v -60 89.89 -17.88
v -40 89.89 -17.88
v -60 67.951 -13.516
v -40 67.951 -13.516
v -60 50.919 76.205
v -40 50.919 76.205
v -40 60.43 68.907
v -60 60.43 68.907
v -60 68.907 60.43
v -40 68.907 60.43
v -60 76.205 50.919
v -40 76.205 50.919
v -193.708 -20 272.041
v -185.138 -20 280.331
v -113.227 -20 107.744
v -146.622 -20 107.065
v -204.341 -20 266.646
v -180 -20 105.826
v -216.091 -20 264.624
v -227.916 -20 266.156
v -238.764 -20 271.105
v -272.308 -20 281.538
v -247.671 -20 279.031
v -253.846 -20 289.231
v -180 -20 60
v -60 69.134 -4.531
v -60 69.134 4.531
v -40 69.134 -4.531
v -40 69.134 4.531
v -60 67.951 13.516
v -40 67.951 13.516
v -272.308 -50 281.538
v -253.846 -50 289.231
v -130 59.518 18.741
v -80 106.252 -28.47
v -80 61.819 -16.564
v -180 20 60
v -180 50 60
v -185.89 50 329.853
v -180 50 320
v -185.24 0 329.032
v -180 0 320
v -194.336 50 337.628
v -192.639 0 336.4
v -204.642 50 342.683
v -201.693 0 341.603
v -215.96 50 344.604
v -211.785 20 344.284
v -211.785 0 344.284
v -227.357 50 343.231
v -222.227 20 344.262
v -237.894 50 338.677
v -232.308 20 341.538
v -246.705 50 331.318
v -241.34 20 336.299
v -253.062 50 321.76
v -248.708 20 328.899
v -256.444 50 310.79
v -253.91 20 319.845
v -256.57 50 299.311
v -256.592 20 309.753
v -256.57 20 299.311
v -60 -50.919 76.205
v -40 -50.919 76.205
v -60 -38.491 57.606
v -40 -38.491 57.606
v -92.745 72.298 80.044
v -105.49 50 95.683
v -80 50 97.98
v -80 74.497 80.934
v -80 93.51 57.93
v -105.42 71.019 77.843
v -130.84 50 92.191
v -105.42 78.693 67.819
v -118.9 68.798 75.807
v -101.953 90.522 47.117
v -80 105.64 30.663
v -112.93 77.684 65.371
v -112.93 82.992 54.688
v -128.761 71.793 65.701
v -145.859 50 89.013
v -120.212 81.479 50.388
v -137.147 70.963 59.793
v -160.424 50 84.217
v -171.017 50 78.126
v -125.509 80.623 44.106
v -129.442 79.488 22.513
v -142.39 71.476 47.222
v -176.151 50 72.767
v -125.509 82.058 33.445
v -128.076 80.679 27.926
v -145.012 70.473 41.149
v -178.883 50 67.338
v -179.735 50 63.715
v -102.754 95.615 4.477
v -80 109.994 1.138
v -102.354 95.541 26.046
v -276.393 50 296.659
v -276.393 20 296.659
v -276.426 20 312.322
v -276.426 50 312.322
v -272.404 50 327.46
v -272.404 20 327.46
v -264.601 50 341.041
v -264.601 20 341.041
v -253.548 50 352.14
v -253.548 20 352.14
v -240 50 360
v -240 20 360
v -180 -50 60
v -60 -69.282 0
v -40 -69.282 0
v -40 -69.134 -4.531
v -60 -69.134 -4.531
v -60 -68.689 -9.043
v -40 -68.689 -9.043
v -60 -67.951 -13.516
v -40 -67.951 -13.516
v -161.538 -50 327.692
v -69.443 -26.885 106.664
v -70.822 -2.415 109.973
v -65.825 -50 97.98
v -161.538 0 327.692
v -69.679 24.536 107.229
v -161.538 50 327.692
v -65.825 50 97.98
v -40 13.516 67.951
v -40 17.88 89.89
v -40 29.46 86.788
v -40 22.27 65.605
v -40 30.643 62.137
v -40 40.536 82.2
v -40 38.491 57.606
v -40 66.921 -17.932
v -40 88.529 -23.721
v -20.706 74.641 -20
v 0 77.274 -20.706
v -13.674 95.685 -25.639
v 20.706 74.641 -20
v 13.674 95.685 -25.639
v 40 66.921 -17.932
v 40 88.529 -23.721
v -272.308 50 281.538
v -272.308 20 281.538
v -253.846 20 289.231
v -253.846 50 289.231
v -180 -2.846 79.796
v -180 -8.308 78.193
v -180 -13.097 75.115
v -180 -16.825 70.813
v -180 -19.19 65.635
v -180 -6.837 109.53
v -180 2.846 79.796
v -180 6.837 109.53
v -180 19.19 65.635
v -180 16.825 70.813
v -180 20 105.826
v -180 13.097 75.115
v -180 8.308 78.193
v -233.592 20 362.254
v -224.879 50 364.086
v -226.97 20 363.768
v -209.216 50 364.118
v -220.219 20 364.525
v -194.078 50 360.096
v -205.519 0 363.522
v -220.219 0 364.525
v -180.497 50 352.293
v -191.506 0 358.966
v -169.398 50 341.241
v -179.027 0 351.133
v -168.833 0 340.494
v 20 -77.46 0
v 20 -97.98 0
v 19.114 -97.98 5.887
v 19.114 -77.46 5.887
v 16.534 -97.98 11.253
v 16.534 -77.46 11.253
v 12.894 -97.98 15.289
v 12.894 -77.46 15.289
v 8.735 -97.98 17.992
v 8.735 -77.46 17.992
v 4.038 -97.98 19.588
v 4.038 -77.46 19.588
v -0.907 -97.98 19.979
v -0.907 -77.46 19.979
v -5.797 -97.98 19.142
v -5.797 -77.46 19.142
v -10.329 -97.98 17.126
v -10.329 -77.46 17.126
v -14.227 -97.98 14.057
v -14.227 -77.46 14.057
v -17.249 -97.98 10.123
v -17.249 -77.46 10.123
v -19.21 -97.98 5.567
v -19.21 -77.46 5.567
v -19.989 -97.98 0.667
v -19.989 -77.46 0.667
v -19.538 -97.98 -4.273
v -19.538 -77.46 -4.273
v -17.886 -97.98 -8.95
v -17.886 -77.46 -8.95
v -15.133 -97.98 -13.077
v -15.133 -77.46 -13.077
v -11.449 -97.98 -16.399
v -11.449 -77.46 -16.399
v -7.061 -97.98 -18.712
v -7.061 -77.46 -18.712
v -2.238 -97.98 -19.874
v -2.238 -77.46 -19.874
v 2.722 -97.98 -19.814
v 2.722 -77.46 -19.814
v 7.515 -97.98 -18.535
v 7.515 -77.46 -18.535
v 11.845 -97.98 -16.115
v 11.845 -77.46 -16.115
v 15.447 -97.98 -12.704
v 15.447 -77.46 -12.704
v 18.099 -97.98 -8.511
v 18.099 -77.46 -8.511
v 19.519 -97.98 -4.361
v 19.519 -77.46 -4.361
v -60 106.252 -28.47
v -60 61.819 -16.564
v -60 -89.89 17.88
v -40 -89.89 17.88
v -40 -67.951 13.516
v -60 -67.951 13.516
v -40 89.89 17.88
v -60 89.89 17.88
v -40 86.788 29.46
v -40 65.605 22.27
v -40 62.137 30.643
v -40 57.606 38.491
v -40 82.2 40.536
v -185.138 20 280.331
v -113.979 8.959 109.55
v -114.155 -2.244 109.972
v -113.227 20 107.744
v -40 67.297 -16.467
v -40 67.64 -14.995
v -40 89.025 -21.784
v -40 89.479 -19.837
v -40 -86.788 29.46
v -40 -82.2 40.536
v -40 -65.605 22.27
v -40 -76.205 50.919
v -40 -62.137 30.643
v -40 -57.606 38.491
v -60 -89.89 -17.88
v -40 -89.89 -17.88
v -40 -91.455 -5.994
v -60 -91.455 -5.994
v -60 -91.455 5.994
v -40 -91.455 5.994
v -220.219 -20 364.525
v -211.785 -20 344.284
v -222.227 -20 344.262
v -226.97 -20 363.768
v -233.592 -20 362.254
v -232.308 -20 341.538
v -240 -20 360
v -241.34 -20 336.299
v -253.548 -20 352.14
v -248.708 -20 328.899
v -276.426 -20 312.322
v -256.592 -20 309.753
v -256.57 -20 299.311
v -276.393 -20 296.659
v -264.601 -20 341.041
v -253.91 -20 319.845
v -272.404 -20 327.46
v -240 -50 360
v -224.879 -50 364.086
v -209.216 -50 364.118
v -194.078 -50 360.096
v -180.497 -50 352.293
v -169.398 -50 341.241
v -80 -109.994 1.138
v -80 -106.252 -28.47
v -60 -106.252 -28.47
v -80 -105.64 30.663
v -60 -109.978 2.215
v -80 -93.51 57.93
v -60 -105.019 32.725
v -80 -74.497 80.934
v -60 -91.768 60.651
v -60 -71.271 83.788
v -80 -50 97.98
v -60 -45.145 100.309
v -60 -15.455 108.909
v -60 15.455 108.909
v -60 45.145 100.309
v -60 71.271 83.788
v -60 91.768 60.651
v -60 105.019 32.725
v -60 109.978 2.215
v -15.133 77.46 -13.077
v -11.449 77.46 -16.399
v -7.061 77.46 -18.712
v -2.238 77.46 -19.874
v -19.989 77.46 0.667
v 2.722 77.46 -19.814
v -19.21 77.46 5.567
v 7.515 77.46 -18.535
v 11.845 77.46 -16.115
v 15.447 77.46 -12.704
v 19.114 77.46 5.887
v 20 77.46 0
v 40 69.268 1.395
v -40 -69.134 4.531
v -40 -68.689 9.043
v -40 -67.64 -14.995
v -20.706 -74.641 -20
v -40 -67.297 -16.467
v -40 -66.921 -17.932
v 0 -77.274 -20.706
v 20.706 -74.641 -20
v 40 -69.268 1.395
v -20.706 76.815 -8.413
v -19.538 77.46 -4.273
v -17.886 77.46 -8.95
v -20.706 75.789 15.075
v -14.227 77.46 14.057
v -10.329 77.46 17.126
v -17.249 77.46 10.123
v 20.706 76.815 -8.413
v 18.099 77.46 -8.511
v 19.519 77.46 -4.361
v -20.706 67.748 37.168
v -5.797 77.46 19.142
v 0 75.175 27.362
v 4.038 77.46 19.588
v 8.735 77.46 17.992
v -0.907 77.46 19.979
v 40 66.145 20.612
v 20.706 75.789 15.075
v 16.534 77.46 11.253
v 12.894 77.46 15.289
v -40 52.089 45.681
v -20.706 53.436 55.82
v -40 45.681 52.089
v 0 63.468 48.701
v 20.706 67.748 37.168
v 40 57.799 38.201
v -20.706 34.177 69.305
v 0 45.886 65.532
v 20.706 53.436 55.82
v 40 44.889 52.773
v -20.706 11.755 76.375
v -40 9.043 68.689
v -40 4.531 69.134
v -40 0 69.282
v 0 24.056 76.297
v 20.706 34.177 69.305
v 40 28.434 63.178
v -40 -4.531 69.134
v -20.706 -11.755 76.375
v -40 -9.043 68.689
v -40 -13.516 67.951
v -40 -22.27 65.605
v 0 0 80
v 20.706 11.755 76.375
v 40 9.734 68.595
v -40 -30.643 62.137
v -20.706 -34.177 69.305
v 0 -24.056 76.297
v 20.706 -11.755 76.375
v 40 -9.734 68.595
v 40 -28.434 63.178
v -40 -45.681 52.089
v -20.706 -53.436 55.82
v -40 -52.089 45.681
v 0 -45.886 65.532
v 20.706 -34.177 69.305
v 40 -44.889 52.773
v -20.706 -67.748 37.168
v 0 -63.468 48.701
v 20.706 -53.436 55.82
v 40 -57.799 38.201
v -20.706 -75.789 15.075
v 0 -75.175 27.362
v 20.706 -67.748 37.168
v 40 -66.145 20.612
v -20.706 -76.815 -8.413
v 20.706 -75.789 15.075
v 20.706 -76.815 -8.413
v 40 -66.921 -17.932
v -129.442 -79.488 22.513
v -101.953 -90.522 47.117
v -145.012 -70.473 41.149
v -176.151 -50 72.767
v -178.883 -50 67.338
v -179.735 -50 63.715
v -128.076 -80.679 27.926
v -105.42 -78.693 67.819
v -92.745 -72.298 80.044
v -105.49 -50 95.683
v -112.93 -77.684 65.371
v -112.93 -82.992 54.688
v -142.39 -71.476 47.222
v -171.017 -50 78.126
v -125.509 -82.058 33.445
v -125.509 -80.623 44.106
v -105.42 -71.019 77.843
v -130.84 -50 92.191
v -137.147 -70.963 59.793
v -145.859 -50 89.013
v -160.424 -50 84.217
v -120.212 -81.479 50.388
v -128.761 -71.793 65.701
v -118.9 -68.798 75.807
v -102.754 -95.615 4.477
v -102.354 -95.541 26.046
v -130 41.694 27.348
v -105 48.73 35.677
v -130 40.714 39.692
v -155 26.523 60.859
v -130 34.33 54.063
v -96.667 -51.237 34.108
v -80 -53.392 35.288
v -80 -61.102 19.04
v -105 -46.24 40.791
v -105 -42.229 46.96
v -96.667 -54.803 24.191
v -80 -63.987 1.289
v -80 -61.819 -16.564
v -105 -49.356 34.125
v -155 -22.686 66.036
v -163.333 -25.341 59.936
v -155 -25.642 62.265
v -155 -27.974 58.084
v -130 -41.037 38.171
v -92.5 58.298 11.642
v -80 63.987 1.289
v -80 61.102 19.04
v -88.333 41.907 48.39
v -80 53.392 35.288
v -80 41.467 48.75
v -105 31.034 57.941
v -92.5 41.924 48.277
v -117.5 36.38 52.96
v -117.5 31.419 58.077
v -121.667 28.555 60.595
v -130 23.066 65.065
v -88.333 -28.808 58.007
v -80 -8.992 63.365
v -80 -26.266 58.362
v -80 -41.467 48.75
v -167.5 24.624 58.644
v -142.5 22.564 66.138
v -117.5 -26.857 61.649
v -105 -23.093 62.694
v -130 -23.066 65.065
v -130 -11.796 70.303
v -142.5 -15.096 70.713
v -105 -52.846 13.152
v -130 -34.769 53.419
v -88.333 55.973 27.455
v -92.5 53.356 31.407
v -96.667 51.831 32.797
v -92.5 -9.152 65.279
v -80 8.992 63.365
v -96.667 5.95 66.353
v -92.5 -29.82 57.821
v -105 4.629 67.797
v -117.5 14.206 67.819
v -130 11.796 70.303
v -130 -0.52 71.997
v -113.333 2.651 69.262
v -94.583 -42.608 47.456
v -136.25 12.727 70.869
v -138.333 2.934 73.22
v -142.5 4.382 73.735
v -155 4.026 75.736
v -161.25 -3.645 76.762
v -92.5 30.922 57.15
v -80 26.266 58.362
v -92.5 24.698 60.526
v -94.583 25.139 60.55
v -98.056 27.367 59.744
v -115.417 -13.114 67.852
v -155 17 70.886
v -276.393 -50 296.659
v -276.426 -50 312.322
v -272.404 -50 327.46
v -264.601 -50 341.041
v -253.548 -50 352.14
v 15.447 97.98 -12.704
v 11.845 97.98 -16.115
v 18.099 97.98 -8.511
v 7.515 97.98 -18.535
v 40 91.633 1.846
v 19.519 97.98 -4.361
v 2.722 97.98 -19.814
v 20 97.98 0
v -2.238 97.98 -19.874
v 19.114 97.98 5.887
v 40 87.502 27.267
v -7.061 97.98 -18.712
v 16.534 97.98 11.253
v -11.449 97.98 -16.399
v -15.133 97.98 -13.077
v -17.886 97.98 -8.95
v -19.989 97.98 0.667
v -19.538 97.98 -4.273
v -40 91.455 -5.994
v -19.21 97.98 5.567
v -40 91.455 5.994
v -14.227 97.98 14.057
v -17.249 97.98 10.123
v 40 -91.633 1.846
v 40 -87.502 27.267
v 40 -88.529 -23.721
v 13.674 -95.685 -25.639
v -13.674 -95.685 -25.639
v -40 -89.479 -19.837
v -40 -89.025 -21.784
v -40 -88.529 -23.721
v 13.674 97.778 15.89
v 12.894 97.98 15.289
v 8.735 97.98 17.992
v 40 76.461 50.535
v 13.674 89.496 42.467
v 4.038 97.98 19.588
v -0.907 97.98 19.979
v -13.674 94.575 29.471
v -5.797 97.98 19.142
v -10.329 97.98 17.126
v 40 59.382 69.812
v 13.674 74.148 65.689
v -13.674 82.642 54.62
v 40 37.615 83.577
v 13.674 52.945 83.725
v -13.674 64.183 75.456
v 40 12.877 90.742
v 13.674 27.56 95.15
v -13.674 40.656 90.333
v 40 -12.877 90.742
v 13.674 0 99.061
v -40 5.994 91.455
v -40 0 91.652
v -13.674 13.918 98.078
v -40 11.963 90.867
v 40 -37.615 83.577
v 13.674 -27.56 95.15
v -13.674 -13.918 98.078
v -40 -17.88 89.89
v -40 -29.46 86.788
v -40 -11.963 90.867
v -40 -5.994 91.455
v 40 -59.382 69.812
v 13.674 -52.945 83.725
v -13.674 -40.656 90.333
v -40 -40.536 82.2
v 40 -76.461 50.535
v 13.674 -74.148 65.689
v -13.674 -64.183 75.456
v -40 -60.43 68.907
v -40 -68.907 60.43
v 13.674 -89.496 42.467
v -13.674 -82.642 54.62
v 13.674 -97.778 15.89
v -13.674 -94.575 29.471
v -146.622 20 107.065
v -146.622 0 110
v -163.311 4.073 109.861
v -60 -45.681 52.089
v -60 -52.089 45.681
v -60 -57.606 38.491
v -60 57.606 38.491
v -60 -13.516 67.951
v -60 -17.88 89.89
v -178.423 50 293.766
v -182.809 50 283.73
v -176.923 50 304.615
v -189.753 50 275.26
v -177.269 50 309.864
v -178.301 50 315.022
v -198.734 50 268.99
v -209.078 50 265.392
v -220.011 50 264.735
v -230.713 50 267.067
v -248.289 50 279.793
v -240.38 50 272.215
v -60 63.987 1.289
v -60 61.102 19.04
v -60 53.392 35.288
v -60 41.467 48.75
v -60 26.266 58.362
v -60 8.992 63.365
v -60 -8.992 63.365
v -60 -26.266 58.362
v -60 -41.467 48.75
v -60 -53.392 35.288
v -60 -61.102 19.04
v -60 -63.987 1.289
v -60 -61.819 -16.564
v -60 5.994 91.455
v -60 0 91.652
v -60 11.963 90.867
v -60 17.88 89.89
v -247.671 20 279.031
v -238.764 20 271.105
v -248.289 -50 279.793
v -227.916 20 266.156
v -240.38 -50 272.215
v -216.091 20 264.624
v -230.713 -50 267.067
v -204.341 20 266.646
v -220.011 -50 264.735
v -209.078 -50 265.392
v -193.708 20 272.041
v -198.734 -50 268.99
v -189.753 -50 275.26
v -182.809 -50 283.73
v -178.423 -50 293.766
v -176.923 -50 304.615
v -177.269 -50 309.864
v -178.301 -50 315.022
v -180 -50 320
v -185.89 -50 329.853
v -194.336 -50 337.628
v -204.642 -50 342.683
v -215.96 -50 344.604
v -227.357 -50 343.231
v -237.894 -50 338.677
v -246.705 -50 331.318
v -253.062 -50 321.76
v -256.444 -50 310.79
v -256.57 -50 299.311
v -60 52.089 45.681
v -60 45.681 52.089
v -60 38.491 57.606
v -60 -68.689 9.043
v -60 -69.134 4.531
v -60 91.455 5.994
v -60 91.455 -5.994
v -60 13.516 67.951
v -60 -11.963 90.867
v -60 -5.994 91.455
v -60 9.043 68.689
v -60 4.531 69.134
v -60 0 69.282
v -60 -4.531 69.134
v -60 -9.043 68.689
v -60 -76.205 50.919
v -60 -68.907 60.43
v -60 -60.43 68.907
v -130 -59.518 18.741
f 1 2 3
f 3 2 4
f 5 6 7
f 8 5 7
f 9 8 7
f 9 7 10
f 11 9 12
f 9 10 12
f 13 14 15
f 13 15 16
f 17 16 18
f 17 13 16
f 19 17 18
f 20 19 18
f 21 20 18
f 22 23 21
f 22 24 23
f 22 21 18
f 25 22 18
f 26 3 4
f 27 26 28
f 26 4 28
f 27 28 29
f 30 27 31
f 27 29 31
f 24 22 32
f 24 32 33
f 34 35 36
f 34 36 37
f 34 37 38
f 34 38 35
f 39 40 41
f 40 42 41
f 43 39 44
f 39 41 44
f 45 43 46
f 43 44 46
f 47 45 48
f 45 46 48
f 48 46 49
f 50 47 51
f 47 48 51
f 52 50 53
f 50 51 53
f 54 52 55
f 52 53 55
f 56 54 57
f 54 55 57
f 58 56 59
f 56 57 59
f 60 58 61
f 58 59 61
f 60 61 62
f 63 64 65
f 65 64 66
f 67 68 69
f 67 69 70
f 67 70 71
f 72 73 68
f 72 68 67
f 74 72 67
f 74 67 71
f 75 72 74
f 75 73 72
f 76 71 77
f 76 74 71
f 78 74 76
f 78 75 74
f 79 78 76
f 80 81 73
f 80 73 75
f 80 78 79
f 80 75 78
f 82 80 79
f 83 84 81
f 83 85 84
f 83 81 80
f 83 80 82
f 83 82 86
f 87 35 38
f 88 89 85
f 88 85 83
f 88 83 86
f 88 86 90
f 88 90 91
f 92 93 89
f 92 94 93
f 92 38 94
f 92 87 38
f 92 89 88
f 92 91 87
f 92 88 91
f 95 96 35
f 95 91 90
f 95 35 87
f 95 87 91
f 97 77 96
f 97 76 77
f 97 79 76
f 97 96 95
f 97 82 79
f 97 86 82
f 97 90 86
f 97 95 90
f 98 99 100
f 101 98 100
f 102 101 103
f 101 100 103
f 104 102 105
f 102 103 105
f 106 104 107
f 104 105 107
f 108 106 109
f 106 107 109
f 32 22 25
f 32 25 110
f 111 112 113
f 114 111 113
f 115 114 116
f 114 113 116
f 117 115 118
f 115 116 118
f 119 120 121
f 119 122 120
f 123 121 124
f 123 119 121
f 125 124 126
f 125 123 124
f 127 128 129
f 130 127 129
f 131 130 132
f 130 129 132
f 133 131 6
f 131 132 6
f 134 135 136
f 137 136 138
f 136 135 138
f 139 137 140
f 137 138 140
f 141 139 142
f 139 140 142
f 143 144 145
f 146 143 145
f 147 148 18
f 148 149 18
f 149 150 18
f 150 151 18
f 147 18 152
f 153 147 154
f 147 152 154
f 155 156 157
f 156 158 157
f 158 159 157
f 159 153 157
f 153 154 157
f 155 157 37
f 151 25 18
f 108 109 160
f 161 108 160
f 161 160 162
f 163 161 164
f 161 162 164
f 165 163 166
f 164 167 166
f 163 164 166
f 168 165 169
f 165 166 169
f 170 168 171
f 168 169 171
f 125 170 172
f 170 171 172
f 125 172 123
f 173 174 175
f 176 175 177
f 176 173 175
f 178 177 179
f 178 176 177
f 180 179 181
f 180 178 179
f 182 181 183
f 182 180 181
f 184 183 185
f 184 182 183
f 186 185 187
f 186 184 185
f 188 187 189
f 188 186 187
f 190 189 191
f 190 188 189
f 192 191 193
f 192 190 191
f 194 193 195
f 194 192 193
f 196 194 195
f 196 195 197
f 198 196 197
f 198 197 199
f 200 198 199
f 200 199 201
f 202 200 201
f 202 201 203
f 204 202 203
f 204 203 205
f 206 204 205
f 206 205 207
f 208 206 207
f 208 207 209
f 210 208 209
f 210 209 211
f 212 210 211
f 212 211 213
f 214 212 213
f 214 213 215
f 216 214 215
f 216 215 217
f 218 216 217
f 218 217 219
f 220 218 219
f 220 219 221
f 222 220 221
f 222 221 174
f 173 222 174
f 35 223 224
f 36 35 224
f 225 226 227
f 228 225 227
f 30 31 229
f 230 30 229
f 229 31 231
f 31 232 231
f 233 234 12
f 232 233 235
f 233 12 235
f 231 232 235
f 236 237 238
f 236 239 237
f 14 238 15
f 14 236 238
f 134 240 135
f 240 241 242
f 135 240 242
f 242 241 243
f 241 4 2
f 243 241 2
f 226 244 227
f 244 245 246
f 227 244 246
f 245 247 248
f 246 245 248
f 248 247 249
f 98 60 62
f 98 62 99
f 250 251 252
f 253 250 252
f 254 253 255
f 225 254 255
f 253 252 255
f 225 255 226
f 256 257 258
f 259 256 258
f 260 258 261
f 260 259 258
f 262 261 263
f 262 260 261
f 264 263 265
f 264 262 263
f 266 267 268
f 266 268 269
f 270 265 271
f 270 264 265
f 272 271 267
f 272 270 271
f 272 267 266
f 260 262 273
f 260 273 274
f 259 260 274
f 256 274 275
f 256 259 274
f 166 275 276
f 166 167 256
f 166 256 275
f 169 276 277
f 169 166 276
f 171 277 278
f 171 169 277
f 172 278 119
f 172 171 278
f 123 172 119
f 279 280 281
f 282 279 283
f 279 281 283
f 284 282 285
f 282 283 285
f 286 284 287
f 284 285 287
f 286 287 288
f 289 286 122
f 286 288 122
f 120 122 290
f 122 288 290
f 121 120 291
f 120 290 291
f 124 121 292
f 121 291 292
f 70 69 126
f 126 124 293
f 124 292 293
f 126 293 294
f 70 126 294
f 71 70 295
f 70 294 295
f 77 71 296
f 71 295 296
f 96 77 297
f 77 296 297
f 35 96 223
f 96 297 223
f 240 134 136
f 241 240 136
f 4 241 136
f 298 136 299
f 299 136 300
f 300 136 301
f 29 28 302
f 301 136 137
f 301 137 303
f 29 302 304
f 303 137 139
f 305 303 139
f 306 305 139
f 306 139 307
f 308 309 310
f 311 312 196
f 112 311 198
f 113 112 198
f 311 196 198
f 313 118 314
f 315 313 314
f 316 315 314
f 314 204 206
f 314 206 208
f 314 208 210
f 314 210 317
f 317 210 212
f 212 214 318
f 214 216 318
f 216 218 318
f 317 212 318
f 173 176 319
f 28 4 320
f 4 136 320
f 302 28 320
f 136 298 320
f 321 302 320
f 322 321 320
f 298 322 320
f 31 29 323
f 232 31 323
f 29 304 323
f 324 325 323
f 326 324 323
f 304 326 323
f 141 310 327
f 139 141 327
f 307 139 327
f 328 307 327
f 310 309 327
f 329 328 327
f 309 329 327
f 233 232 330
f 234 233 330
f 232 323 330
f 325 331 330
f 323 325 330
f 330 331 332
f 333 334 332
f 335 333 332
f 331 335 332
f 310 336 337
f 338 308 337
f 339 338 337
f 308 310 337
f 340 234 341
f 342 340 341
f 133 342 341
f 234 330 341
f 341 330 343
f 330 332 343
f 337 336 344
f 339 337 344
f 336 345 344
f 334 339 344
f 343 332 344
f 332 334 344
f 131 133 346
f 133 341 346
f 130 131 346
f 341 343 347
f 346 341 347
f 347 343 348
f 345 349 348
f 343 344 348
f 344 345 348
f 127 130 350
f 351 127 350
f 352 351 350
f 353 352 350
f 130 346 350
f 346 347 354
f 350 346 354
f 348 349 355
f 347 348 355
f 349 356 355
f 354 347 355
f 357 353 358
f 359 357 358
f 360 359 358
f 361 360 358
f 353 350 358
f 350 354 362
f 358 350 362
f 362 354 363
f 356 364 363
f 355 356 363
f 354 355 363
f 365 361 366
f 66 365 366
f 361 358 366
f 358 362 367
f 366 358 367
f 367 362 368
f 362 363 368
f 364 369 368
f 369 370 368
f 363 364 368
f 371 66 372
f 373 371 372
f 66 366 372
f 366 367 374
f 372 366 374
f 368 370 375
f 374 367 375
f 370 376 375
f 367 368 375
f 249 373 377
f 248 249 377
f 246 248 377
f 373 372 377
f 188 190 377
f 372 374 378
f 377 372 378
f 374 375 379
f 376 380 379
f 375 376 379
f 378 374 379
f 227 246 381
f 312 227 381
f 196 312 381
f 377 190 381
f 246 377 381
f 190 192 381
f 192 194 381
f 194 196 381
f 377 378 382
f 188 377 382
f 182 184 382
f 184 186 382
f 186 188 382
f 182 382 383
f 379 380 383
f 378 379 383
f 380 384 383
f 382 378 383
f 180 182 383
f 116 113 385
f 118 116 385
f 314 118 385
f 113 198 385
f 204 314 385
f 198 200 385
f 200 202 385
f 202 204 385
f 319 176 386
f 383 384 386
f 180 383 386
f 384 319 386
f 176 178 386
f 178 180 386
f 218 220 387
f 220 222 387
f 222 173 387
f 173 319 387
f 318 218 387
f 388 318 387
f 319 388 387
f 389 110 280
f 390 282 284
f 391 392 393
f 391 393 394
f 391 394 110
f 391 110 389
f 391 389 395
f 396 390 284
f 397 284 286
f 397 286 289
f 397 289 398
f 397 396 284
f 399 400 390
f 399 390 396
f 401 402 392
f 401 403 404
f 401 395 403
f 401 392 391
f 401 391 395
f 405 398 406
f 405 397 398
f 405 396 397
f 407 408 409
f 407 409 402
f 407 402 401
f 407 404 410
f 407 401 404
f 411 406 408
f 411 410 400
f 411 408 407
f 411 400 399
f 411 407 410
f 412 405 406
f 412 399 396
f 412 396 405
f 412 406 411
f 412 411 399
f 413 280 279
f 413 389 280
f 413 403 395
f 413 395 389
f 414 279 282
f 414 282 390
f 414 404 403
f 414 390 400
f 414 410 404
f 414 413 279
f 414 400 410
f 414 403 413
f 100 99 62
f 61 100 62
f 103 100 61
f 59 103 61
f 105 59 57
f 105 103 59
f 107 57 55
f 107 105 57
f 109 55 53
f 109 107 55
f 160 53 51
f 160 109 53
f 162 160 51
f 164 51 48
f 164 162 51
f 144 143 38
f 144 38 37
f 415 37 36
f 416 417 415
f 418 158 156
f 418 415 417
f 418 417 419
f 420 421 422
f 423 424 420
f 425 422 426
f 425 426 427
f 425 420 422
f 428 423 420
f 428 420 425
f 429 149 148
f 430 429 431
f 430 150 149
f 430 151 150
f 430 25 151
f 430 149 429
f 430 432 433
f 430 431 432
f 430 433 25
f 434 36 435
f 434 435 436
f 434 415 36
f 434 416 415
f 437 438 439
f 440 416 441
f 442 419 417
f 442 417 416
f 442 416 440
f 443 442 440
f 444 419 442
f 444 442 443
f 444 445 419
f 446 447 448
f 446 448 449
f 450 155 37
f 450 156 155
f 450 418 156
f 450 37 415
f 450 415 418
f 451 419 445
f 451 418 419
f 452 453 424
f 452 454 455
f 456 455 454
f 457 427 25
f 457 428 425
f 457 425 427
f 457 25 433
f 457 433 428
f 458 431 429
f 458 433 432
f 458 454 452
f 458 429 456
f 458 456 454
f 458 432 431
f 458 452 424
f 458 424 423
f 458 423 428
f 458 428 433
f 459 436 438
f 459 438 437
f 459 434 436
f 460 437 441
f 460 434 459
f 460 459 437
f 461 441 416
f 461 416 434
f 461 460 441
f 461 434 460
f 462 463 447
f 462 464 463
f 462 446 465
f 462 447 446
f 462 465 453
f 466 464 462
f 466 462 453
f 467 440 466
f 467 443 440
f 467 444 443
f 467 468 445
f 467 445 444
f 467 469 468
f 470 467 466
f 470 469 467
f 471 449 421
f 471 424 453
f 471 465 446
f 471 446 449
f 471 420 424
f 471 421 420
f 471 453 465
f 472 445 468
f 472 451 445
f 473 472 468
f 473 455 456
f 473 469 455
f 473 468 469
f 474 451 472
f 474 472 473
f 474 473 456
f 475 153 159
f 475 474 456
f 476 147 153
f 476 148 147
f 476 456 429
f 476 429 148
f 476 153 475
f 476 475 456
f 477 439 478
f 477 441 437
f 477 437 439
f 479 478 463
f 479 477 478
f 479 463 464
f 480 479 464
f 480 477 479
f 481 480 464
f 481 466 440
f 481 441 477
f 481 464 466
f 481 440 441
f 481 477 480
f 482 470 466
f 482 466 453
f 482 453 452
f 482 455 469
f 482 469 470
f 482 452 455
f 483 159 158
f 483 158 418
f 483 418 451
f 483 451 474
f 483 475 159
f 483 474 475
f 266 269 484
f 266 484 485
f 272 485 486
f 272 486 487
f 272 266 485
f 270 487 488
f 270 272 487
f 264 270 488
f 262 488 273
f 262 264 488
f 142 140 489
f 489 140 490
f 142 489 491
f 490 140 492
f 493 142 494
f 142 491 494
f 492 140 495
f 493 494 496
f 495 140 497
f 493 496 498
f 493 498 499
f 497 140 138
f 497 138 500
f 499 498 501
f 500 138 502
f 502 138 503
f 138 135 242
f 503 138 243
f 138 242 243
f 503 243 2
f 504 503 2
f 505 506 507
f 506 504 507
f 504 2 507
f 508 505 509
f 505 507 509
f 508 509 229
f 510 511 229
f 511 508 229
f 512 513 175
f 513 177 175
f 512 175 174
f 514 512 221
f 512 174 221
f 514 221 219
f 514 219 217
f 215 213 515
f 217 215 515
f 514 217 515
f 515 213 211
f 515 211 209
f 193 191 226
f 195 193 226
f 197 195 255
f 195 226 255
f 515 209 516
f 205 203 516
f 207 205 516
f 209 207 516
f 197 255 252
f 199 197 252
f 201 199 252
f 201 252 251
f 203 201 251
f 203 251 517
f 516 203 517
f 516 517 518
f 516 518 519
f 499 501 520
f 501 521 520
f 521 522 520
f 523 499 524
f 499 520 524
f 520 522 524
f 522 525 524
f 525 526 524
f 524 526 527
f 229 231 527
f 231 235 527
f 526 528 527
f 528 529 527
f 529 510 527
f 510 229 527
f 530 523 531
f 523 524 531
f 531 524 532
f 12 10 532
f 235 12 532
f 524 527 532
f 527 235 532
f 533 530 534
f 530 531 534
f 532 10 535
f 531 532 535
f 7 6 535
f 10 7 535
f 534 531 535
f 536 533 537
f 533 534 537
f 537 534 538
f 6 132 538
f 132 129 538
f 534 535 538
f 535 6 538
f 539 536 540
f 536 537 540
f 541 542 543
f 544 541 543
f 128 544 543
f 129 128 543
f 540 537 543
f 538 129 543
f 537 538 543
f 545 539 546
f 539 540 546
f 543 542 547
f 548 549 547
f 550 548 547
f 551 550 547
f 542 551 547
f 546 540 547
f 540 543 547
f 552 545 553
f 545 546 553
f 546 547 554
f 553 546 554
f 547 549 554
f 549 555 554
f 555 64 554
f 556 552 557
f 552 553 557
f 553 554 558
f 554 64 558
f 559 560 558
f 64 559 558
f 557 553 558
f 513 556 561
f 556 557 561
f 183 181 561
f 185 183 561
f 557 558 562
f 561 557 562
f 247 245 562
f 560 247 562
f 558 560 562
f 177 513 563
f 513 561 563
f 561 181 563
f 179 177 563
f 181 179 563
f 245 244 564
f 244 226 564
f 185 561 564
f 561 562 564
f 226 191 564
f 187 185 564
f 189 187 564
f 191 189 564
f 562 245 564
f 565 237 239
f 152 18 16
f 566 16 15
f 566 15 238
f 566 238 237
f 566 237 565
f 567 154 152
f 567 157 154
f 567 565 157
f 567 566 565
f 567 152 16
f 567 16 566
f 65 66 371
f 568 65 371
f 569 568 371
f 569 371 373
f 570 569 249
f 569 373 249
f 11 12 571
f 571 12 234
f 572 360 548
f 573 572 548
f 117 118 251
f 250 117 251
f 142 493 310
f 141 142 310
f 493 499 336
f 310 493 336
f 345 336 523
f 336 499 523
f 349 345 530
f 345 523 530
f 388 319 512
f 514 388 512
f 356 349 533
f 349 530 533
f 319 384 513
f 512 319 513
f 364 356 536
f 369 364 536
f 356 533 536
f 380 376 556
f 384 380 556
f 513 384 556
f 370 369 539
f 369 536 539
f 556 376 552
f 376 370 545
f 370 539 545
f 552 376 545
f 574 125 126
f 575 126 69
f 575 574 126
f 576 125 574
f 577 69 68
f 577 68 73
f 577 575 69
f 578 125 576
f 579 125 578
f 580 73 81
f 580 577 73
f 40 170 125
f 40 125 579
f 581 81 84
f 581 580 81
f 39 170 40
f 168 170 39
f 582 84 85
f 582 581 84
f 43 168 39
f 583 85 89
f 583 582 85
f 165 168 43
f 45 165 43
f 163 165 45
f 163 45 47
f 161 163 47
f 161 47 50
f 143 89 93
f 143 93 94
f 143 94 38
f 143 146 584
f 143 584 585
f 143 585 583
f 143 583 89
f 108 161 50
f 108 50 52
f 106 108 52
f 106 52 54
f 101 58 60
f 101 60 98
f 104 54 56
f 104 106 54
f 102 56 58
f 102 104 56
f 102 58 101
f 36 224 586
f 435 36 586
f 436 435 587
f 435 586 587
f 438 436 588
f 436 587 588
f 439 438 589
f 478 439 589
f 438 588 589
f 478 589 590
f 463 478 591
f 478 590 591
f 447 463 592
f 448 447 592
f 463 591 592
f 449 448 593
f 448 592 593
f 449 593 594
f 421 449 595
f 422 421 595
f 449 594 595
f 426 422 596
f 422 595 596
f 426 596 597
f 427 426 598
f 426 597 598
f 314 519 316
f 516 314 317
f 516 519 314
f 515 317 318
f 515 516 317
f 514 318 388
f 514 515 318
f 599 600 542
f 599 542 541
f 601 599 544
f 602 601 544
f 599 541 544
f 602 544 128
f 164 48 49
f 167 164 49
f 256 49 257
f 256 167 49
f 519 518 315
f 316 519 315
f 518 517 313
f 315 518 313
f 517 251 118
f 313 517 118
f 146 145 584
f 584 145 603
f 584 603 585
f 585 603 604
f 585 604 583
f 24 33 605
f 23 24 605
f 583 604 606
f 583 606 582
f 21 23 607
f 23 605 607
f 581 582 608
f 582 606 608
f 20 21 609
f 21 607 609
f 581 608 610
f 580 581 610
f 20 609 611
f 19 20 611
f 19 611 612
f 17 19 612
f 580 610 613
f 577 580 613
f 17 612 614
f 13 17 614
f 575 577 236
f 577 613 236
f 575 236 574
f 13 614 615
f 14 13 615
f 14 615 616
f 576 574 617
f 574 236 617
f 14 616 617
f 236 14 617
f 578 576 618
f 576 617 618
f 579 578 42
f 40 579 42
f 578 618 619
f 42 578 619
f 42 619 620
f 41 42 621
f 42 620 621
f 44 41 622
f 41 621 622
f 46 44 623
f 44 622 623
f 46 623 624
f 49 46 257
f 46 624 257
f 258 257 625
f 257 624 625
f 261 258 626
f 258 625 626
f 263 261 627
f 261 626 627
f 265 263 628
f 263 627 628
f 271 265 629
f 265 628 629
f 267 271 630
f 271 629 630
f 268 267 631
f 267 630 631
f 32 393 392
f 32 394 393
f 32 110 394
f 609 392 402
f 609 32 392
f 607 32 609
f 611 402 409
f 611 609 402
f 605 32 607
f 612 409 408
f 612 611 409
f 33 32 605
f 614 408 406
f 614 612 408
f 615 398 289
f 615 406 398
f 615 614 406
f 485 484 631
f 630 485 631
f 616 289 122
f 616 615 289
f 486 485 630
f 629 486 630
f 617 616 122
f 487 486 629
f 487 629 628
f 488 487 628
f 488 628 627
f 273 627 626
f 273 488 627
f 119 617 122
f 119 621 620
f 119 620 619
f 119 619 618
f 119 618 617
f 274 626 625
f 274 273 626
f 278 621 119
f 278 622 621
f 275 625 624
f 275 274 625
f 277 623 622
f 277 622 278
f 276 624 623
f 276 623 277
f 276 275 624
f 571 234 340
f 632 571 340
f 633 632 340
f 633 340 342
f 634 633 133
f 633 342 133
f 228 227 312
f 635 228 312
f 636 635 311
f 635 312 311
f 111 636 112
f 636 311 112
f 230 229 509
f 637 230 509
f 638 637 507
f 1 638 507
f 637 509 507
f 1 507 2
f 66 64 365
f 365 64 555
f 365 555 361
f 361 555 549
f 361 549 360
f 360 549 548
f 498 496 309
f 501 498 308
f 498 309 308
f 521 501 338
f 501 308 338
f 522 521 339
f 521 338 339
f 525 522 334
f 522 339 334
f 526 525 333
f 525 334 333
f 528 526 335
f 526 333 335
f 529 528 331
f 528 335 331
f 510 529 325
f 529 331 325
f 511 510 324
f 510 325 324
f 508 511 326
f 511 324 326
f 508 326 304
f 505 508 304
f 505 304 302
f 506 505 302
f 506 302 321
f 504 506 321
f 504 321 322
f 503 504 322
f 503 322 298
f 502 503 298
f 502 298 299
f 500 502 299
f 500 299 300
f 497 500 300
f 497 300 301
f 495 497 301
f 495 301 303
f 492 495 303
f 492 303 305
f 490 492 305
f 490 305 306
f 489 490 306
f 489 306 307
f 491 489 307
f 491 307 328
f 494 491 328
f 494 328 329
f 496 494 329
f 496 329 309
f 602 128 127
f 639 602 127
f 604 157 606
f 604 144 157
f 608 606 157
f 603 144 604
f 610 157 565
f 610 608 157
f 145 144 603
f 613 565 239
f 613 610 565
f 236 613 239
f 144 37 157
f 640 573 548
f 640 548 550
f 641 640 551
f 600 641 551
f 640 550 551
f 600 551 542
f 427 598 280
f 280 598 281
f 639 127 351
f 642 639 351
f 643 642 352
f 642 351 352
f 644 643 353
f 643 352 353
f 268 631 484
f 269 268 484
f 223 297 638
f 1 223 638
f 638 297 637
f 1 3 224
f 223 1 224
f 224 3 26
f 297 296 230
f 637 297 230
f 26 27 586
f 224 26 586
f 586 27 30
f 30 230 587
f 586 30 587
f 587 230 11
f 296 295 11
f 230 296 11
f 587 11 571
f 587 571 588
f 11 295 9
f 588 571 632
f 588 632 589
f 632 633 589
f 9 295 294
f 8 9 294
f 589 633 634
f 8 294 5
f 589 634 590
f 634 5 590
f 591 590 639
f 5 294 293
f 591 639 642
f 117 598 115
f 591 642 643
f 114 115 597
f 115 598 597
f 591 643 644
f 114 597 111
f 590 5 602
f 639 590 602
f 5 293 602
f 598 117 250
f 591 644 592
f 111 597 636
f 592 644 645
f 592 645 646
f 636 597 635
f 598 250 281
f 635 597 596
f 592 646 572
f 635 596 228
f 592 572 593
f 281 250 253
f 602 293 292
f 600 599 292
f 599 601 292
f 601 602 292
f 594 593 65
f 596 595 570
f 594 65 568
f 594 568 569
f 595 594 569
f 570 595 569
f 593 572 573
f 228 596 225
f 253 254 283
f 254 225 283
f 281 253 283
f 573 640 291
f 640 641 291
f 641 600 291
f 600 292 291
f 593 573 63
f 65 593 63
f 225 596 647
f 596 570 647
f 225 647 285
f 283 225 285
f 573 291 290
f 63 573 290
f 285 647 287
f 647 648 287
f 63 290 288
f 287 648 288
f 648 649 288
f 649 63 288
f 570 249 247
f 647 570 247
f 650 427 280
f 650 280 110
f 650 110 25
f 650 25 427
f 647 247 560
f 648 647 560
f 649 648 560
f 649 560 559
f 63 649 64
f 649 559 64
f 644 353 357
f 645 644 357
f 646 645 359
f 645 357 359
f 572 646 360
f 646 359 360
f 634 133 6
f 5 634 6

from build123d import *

# Parameters (mm, degrees)
F1_ANGLE_BACK  = 105
F1_ANGLE       = 210
F2_R           = 20
F3_DEPTH       = 100.001
F3_DEPTH_BACK  = 100.001
F5_DEPTH       = 20
F7_DEPTH       = 20
F19_DEPTH      = 110.0010001
F19_DEPTH_BACK = 110.0010001


# Not quite as in the source:
# - a feature names something its author has since deleted; it is built from what else it names


with BuildPart() as f1:
    # F0 (on Front) → F1 (revolve)
    with BuildSketch(Plane.XZ, mode=Mode.PRIVATE) as f1_sk:
        with BuildLine():
            Line((40, 69.2820323028), (40, 91.6515138991))
            ThreePointArc((40, 91.6515138991), (0, 100), (-40, 91.6515138991))
            Line((-40, 91.6515138991), (-40, 69.2820323028))
            ThreePointArc((-40, 69.2820323028), (0, 80), (40, 69.2820323028))
        make_face()
    revolve(f1_sk.sketch.rotate(Axis((77.3328692646, 0, 0), (1, 0, 0)), -F1_ANGLE_BACK), axis=Axis((77.3328692646, 0, 0), (1, 0, 0)), revolution_arc=F1_ANGLE)

    # F2 (on Front) → F3 (cut, two sides)
    with BuildSketch(Plane.XZ) as f3_sk:
        Circle(F2_R)
    extrude(amount=-F3_DEPTH, mode=Mode.SUBTRACT)
    extrude(f3_sk.sketch, amount=F3_DEPTH_BACK, mode=Mode.SUBTRACT)

    # F4 (on face) → F5 (join)
    with BuildSketch(Plane(origin=(-40, 0, 0), x_dir=(0, -1, 0), z_dir=(-1, 0, 0))):
        with BuildLine():
            Line((0, 91.6515138991), (0, 69.2820323028))
            ThreePointArc((0, 69.2820323028), (6.7908266825, 68.9484203805), (13.5162539919, 67.950797479))
            Line((13.5162539919, 67.950797479), (17.8803233598, 89.8904557589))
            ThreePointArc((17.8803233598, 89.8904557589), (8.9834192993, 91.2101868088), (0, 91.6515138991))
        make_face()
        with BuildLine():
            ThreePointArc((-57.6059045383, 38.4910348305), (-48.9897948557, 48.9897948557), (-38.4910348305, 57.6059045383))
            Line((-38.4910348305, 57.6059045383), (-50.9188529335, 76.2054487286))
            ThreePointArc((-50.9188529335, 76.2054487286), (-64.8074069841, 64.8074069841), (-76.2054487286, 50.9188529335))
            Line((-76.2054487286, 50.9188529335), (-57.6059045383, 38.4910348305))
        make_face()
        with BuildLine():
            ThreePointArc((-67.950797479, -13.5162539919), (-69.2820323028, 0), (-67.950797479, 13.5162539919))
            Line((-67.950797479, 13.5162539919), (-89.8904557589, 17.8803233598))
            ThreePointArc((-89.8904557589, 17.8803233598), (-91.6515138991, 0), (-89.8904557589, -17.8803233598))
            Line((-89.8904557589, -17.8803233598), (-67.950797479, -13.5162539919))
        make_face()
        with BuildLine():
            Line((50.9188529335, 76.2054487286), (38.4910348305, 57.6059045383))
            ThreePointArc((38.4910348305, 57.6059045383), (48.9897948557, 48.9897948557), (57.6059045383, 38.4910348305))
            Line((57.6059045383, 38.4910348305), (76.2054487286, 50.9188529335))
            ThreePointArc((76.2054487286, 50.9188529335), (64.8074069841, 64.8074069841), (50.9188529335, 76.2054487286))
        make_face()
        with BuildLine():
            ThreePointArc((-13.5162539919, 67.950797479), (-6.7908266825, 68.9484203805), (0, 69.2820323028))
            Line((0, 69.2820323028), (0, 91.6515138991))
            ThreePointArc((0, 91.6515138991), (-8.9834192993, 91.2101868088), (-17.8803233598, 89.8904557589))
            Line((-17.8803233598, 89.8904557589), (-13.5162539919, 67.950797479))
        make_face()
        with BuildLine():
            Line((89.8904557589, 17.8803233598), (67.950797479, 13.5162539919))
            ThreePointArc((67.950797479, 13.5162539919), (68.9484203805, 6.7908266825), (69.2820323028, 0))
            ThreePointArc((69.2820323028, 0), (68.9484203805, -6.7908266825), (67.950797479, -13.5162539919))
            Line((67.950797479, -13.5162539919), (89.8904557589, -17.8803233598))
            ThreePointArc((89.8904557589, -17.8803233598), (91.6515138991, 0), (89.8904557589, 17.8803233598))
        make_face()
    extrude(amount=F5_DEPTH)

    # F6 (on face) → F7 (join)
    with BuildSketch(Plane(origin=(-60, 0, 0), x_dir=(0, -1, 0), z_dir=(-1, 0, 0))):
        with BuildLine():
            Line((61.8192528825, -16.5644188866), (106.2518408918, -28.4700949613))
            ThreePointArc((106.2518408918, -28.4700949613), (0, 110), (-106.2518408918, -28.4700949613))
            Line((-106.2518408918, -28.4700949613), (-61.8192528825, -16.5644188866))
            ThreePointArc((-61.8192528825, -16.5644188866), (0, 64), (61.8192528825, -16.5644188866))
        make_face()
    extrude(amount=F7_DEPTH)

    # F7_face (on face) → F11 section 0
    with BuildSketch(Plane(origin=(-80, 0, 46.9243182834), x_dir=(0, -1, 0), z_dir=(-1, 0, 0))):
        with BuildLine():
            Line((-106.2518408918, -75.3944132447), (-61.8192528825, -63.4887371699))
            ThreePointArc((-61.8192528825, -63.4887371699), (0, 17.0756817166), (61.8192528825, -63.4887371699))
            Line((61.8192528825, -63.4887371699), (106.2518408918, -75.3944132447))
            ThreePointArc((106.2518408918, -75.3944132447), (0, 63.0756817166), (-106.2518408918, -75.3944132447))
        make_face()
    # F9 (on offset) → F11 section 1
    with BuildSketch(Plane(origin=(-180, 0, 0), x_dir=(0, -1, 0), z_dir=(-1, 0, 0))):
        with BuildLine():
            Line((20, 60), (50, 60))
            ThreePointArc((50, 60), (0, 110), (-50, 60))
            Line((-50, 60), (-20, 60))
            ThreePointArc((-20, 60), (0, 80), (20, 60))
        make_face()
    loft()

    # F16 (on face) → F17 (join, up to the next surface of F1)
    with BuildSketch(Plane(origin=(-163.3136094675, 0, 391.9526627219), x_dir=(0.9230769231, 0, 0.3846153846), z_dir=(-0.3846153846, 0, 0.9230769231))):
        Polygon((-143.0769230769, -20), (-143.0769230769, -50), (-23.0769230769, -50), (-23.0769230769, 50), (-143.0769230769, 50), (-143.0769230769, 20), (-63.0769230769, 20), (-63.0769230769, -20), align=None)
    extrude(until=Until.NEXT, dir=(0.3846153846, 0, -0.9230769231))

    # F18 (on Front) → F19 (cut, two sides)
    with BuildSketch(Plane.XZ) as f19_sk:
        with BuildLine():
            Line((-295.3846153846, 336.9230769231), (-272.3076923077, 281.5384615385))
            ThreePointArc((-272.3076923077, 281.5384615385), (-274.8460121427, 288.9650307682), (-276.3932544968, 296.6593818913))
            ThreePointArc((-276.3932544968, 296.6593818913), (-268.9472491257, 334.5066125365), (-240.0000021838, 359.9999990901))
            Line((-240.0000021838, 359.9999990901), (-295.3846153846, 336.9230769231))
        make_face()
        with BuildLine():
            ThreePointArc((-240.0000021838, 359.9999990901), (-194.0780897016, 360.0960709742), (-161.5384615385, 327.6923076923))
            Line((-161.5384615385, 327.6923076923), (-184.6153846154, 383.0769230769))
            Line((-184.6153846154, 383.0769230769), (-240.0000021838, 359.9999990901))
        make_face()
        with BuildLine():
            Line((-216.9230769231, 304.6153846154), (-180, 320))
            ThreePointArc((-180, 320), (-227.3566461545, 343.2306747618), (-256.5698619723, 299.3113827993))
            Line((-256.5698619723, 299.3113827993), (-216.9230769231, 304.6153846154))
        make_face()
        with BuildLine():
            ThreePointArc((-256.5698619723, 299.3113827993), (-255.5383670695, 294.1818153839), (-253.8461538462, 289.2307692308))
            Line((-253.8461538462, 289.2307692308), (-216.9230769231, 304.6153846154))
            Line((-216.9230769231, 304.6153846154), (-256.5698619723, 299.3113827993))
        make_face()
        with BuildLine():
            ThreePointArc((-253.8461538462, 289.2307692308), (-209.0784315175, 265.3921575877), (-176.9230769231, 304.6153846154))
            ThreePointArc((-176.9230769231, 304.6153846154), (-177.6998498954, 312.4600300209), (-180, 320))
            Line((-180, 320), (-216.9230769231, 304.6153846154))
            Line((-216.9230769231, 304.6153846154), (-253.8461538462, 289.2307692308))
        make_face()
        with BuildLine():
            Line((-272.3076923077, 281.5384615385), (-253.8461538462, 289.2307692308))
            ThreePointArc((-253.8461538462, 289.2307692308), (-255.5383670695, 294.1818153839), (-256.5698619723, 299.3113827993))
            Line((-256.5698619723, 299.3113827993), (-276.3932544968, 296.6593818913))
            ThreePointArc((-276.3932544968, 296.6593818913), (-274.8460121427, 288.9650307682), (-272.3076923077, 281.5384615385))
        make_face()
    extrude(amount=-F19_DEPTH, mode=Mode.SUBTRACT)
    extrude(f19_sk.sketch, amount=F19_DEPTH_BACK, mode=Mode.SUBTRACT)


solid = f1.part
